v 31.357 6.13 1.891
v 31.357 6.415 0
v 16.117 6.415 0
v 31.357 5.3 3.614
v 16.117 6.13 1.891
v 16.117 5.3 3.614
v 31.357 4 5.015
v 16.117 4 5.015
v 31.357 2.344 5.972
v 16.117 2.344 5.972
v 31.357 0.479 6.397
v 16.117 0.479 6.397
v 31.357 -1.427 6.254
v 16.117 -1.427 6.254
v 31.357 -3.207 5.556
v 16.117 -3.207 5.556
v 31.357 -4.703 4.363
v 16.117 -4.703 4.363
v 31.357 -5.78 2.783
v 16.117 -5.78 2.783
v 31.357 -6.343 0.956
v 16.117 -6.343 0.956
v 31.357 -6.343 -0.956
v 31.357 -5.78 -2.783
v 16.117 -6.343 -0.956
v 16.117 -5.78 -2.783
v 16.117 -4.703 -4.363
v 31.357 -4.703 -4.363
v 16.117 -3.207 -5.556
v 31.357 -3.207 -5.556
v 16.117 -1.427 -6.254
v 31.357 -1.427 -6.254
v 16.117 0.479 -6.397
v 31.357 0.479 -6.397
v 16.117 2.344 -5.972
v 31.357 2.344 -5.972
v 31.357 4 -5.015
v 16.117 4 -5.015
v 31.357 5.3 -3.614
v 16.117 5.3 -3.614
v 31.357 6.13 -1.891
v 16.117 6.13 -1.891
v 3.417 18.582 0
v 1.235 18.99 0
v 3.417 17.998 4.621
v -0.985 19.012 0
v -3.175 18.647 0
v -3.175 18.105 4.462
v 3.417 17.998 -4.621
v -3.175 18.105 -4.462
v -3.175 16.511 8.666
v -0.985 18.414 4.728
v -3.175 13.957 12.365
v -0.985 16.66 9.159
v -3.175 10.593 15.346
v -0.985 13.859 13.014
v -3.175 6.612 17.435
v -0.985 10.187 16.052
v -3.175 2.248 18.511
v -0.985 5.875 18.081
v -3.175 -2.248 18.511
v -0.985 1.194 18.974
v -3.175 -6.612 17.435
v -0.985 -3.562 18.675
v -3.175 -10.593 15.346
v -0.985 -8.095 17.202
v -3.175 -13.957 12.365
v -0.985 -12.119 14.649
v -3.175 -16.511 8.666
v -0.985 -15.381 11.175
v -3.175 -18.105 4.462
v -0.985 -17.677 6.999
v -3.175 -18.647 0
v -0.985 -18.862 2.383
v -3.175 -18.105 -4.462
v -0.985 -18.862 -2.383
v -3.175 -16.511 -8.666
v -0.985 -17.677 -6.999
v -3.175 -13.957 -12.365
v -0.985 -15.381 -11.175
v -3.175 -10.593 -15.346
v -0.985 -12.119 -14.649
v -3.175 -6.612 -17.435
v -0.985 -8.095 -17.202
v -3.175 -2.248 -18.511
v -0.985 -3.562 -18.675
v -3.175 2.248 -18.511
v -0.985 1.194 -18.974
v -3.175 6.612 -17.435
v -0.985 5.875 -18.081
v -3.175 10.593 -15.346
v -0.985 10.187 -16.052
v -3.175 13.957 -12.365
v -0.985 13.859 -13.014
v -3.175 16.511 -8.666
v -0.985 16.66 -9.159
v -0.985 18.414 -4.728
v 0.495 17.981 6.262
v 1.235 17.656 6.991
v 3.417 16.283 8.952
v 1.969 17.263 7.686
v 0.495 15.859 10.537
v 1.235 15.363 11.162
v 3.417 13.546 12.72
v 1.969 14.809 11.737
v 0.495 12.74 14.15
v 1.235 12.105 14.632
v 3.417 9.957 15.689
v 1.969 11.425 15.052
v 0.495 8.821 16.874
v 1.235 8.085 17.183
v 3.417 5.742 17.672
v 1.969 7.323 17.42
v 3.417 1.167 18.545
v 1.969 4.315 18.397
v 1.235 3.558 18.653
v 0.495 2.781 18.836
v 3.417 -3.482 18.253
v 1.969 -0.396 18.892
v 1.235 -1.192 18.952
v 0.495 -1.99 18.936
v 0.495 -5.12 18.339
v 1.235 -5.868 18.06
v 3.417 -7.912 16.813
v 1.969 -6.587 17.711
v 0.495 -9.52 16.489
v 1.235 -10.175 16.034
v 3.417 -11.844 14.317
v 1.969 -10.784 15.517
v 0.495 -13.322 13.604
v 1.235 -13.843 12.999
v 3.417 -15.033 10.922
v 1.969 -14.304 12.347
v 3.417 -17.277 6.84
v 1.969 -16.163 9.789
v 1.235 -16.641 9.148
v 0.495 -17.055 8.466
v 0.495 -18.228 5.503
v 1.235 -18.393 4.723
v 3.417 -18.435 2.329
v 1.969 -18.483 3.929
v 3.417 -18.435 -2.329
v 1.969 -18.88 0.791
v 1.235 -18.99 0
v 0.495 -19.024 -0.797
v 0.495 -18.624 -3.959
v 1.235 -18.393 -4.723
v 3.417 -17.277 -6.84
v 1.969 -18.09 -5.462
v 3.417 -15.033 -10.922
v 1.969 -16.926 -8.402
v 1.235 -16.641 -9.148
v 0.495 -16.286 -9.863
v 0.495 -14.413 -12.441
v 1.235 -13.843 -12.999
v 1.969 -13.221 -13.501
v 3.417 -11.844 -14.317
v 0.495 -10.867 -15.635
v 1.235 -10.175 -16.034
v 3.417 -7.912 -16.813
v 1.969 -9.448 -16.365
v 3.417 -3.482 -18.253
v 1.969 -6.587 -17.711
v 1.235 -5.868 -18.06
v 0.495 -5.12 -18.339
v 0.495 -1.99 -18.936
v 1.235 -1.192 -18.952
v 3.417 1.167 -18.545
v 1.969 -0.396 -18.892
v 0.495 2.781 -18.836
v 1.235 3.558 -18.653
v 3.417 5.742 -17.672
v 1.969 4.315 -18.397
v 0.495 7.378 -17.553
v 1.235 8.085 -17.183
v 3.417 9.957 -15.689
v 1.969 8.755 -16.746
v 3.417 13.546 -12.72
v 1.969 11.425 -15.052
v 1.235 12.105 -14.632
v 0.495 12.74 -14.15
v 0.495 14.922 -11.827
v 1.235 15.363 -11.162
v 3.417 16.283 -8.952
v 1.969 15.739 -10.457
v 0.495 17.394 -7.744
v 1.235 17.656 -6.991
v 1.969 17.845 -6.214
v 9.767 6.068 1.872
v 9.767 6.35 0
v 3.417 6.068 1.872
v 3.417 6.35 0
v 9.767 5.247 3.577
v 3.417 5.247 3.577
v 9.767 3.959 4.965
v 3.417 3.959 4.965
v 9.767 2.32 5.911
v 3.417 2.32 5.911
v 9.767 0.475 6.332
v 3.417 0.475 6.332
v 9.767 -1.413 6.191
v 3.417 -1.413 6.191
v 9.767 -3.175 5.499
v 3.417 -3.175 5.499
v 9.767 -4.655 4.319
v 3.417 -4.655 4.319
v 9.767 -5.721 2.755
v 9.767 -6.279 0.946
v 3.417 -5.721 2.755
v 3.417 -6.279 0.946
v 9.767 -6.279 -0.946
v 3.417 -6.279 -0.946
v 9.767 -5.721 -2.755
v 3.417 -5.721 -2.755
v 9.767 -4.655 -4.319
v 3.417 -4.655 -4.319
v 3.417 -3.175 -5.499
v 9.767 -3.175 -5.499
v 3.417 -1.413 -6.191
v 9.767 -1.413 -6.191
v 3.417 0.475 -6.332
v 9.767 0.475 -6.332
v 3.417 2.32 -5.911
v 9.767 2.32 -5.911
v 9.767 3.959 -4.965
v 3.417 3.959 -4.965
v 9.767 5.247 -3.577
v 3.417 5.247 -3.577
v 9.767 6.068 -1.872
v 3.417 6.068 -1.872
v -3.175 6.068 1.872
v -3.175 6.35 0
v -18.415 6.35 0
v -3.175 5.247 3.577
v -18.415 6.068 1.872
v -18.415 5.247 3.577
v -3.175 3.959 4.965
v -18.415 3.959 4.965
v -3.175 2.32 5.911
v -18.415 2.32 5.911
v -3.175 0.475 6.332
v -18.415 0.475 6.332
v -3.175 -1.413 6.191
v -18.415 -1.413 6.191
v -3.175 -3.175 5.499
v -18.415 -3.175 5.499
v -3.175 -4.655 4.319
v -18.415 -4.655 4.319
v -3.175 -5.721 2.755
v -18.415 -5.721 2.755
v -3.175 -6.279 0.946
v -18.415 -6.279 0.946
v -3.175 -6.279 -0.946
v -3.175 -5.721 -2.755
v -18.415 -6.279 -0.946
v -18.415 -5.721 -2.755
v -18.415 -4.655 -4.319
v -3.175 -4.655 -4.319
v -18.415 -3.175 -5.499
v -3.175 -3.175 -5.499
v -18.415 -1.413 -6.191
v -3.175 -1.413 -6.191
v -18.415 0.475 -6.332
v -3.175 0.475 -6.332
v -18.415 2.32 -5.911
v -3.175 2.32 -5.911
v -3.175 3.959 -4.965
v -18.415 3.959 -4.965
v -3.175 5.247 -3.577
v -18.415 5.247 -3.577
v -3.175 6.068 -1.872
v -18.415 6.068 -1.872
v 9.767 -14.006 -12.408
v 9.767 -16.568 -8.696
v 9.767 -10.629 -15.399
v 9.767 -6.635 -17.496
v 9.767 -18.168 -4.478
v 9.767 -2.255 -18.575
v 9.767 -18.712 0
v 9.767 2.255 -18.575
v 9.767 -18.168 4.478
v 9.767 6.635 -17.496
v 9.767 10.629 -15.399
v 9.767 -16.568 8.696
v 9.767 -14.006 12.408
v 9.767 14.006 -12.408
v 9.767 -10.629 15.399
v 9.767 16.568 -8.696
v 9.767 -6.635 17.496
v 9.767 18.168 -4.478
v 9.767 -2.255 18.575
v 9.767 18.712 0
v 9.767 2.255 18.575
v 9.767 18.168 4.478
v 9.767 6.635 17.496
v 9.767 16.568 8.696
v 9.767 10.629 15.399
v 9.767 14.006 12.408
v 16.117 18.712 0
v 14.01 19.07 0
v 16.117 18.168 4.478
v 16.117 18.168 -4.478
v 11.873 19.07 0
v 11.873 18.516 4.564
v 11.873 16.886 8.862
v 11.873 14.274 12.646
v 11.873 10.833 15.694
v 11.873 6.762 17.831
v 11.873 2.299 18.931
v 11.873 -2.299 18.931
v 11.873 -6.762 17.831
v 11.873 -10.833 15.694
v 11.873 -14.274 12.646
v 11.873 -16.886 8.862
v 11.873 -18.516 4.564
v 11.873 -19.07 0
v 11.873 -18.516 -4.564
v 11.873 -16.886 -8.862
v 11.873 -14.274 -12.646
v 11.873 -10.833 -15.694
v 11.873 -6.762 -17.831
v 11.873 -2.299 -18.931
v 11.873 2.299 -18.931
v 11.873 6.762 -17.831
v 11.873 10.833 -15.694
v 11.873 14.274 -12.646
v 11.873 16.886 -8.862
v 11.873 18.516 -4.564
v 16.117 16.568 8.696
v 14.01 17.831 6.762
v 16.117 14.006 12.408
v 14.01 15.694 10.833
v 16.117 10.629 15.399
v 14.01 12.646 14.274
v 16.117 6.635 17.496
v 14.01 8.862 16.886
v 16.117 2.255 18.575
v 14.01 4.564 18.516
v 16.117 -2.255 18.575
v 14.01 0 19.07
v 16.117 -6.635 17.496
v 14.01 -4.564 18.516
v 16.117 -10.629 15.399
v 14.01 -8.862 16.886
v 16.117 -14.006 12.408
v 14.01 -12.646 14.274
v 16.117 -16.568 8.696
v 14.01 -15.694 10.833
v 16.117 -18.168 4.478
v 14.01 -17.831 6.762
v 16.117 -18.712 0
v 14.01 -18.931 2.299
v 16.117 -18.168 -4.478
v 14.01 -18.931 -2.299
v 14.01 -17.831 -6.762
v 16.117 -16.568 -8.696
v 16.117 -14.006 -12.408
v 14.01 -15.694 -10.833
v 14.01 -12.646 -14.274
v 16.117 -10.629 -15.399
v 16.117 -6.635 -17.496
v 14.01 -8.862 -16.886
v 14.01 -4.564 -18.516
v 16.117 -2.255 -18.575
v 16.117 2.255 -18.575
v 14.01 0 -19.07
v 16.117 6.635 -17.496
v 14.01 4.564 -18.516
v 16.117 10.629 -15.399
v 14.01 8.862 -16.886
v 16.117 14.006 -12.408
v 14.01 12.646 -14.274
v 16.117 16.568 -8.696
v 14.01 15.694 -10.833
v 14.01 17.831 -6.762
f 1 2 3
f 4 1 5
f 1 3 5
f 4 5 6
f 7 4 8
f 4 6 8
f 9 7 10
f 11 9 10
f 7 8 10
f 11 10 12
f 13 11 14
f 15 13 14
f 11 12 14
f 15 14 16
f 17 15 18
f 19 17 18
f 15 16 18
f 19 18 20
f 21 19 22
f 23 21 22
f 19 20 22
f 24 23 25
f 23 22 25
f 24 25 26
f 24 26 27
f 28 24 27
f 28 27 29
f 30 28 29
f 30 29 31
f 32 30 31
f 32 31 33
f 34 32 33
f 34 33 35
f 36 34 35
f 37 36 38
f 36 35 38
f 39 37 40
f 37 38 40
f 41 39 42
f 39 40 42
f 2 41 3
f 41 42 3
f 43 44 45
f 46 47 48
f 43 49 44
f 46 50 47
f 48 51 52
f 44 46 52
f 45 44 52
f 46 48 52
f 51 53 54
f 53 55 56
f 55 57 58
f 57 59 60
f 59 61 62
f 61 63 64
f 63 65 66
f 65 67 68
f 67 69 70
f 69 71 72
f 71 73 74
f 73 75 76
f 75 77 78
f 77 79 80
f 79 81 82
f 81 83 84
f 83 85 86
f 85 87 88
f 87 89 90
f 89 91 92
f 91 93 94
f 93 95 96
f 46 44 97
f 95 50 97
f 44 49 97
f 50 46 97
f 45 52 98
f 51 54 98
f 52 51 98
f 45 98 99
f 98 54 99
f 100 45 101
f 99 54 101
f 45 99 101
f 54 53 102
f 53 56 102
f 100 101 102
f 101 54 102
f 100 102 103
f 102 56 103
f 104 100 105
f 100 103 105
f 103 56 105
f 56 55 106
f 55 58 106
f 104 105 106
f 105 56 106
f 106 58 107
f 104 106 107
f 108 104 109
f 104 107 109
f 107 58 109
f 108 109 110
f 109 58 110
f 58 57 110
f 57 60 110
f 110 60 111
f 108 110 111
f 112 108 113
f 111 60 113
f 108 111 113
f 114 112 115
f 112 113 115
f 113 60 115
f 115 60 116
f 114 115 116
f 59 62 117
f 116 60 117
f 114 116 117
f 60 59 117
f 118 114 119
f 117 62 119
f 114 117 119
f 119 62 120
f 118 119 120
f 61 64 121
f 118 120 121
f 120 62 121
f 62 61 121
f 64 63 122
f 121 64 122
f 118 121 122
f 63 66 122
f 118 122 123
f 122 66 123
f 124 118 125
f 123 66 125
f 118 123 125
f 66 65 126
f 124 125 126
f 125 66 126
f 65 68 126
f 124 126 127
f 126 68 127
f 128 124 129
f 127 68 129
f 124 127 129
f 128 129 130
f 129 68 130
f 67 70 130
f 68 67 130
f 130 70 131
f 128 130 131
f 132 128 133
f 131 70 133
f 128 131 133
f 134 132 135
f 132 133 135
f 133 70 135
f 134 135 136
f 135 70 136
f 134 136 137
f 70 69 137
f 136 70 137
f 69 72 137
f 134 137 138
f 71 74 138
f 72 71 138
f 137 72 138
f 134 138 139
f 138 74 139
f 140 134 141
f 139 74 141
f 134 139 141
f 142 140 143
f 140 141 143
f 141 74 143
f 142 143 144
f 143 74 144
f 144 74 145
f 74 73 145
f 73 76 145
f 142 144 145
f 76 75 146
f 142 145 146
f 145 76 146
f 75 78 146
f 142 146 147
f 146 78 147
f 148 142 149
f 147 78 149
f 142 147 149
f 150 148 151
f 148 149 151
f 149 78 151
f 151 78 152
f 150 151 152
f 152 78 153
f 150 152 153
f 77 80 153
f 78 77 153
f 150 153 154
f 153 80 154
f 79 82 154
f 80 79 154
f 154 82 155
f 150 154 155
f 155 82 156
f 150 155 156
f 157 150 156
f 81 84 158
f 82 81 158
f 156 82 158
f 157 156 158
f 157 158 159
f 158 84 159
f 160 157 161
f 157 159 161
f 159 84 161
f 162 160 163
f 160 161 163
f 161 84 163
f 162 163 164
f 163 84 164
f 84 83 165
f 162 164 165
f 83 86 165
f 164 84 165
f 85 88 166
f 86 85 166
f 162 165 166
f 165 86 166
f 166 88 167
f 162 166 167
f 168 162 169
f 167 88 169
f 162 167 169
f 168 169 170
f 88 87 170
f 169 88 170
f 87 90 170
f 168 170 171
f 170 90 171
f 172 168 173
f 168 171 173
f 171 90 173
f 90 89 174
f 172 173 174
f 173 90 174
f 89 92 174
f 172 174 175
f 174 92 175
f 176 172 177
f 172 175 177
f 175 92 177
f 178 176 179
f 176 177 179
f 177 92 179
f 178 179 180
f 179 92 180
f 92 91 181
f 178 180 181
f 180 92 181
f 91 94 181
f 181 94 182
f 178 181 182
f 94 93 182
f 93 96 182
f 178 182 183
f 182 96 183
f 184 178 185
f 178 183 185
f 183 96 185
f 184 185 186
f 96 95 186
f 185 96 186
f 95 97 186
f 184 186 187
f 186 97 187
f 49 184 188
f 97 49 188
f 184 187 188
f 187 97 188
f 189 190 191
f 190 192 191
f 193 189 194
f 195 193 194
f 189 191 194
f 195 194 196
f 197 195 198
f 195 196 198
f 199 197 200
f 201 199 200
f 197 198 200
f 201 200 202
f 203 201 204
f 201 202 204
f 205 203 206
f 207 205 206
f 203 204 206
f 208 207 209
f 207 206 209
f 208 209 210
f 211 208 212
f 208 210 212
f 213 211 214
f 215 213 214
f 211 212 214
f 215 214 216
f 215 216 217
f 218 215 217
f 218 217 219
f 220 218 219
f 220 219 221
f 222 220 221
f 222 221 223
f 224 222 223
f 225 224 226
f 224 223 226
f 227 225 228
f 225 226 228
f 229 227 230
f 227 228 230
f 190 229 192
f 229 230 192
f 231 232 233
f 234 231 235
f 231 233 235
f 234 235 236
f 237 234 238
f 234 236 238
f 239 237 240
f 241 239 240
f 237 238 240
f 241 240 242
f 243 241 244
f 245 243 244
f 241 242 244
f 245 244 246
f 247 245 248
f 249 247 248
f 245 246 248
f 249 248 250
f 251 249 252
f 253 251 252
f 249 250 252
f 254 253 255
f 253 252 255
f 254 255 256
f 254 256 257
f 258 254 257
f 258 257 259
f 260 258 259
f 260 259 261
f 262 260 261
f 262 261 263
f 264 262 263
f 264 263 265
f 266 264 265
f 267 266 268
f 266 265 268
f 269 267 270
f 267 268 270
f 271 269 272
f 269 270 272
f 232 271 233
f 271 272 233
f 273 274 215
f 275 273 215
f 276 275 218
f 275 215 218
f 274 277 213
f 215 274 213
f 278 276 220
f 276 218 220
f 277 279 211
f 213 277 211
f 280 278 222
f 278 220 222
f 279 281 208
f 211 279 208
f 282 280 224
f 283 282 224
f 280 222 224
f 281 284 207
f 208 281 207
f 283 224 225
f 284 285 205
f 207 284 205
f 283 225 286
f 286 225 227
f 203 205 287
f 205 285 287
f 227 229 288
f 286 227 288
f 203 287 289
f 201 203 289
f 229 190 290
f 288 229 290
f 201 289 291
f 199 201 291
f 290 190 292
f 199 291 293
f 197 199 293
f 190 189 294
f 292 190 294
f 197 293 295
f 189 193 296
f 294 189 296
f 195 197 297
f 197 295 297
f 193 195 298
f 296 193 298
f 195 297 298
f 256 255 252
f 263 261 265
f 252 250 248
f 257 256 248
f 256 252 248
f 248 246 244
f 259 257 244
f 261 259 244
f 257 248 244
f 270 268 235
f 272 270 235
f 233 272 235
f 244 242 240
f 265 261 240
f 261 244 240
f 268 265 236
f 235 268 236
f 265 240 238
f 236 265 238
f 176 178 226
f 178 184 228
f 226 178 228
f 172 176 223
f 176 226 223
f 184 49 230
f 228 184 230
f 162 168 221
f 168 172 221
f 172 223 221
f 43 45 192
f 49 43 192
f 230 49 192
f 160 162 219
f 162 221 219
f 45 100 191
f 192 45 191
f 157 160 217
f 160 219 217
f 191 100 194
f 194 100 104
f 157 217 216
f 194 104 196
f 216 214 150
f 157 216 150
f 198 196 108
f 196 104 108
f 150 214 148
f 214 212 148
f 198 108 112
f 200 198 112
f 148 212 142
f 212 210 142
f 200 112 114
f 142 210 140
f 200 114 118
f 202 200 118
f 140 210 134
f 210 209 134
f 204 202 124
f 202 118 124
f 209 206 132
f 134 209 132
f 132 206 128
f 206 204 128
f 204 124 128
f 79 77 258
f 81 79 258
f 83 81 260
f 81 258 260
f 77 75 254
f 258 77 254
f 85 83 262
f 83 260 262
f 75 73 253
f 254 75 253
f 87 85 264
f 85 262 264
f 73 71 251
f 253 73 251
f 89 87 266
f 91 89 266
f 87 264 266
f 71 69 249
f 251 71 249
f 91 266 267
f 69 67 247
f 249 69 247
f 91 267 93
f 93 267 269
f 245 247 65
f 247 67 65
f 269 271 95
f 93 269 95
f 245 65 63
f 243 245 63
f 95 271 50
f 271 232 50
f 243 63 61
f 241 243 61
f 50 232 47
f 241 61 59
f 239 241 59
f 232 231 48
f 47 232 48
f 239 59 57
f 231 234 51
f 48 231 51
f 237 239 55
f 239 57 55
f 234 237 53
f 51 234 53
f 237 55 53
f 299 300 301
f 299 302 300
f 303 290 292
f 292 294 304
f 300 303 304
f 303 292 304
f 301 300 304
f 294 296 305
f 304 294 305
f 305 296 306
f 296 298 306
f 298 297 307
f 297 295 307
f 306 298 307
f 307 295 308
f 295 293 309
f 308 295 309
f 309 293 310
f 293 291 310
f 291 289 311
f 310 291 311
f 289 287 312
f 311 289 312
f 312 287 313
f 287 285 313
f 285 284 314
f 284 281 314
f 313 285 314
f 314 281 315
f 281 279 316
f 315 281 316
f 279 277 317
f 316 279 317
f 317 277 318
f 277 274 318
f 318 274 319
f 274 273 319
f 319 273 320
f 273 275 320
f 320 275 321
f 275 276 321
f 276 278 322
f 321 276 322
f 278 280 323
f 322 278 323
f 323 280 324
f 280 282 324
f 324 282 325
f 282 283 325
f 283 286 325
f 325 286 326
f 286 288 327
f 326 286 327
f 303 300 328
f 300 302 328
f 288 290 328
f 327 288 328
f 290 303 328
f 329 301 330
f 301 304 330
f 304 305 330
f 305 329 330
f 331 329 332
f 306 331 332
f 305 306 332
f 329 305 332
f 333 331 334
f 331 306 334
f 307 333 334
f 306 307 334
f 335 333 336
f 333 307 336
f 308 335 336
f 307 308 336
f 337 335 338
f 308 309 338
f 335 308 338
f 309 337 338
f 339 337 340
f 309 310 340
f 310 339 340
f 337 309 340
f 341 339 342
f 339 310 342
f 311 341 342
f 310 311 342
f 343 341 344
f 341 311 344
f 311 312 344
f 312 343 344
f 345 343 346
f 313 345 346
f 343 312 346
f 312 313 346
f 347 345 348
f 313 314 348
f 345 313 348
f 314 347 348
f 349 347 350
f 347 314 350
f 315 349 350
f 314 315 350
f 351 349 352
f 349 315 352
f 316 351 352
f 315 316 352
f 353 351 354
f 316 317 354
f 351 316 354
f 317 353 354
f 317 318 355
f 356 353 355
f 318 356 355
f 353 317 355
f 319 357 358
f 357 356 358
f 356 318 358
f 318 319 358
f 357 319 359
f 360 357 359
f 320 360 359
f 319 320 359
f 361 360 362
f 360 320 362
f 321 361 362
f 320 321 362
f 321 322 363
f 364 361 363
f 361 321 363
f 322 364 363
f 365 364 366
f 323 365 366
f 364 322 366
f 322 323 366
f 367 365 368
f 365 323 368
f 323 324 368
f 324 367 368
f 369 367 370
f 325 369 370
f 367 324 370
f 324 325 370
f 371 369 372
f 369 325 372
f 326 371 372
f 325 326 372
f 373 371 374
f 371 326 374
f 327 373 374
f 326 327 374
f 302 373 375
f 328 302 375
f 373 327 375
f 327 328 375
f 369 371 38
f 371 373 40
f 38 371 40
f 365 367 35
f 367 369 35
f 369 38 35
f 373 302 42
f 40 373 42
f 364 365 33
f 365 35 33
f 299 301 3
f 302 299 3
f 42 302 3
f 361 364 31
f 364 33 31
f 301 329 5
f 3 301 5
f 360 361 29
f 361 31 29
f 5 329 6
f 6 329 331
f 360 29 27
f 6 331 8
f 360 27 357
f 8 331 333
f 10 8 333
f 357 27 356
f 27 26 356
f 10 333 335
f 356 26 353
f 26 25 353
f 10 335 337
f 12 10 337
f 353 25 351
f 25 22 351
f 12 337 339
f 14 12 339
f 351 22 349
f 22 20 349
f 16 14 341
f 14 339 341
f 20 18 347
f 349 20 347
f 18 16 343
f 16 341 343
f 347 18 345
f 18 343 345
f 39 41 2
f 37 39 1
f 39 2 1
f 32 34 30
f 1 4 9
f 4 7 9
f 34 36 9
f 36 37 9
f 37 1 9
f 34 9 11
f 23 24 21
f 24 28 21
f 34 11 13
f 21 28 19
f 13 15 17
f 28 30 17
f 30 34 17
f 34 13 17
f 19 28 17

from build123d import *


with BuildPart() as f1:
    # F0 (on Top) → F1 (revolve)
    with BuildSketch(Plane.XY):
        with BuildLine():
            ThreePointArc((3.416723, 18.581762), (0.12515, 19.049383), (-3.175, 18.646722))
            Line((-3.175, 18.646722), (-3.175, 6.35))
            Line((-3.175, 6.35), (-18.415, 6.35))
            Line((-18.415, 6.35), (-18.415, 0))
            Line((-18.415, 0), (31.356723, 0))
            Line((31.356723, 0), (31.356723, 6.414971))
            Line((31.356723, 6.414971), (16.116723, 6.414971))
            Line((16.116723, 6.414971), (16.116723, 18.711693))
            ThreePointArc((16.116723, 18.711693), (12.941723, 19.114971), (9.766723, 18.711693))
            Line((9.766723, 18.711693), (9.766723, 6.35))
            Line((9.766723, 6.35), (3.416723, 6.35))
            Line((3.416723, 6.35), (3.416723, 18.581762))
        make_face()
    revolve(axis=Axis((6.083893, 0, 0), (1, 0, 0)))


solid = f1.part
